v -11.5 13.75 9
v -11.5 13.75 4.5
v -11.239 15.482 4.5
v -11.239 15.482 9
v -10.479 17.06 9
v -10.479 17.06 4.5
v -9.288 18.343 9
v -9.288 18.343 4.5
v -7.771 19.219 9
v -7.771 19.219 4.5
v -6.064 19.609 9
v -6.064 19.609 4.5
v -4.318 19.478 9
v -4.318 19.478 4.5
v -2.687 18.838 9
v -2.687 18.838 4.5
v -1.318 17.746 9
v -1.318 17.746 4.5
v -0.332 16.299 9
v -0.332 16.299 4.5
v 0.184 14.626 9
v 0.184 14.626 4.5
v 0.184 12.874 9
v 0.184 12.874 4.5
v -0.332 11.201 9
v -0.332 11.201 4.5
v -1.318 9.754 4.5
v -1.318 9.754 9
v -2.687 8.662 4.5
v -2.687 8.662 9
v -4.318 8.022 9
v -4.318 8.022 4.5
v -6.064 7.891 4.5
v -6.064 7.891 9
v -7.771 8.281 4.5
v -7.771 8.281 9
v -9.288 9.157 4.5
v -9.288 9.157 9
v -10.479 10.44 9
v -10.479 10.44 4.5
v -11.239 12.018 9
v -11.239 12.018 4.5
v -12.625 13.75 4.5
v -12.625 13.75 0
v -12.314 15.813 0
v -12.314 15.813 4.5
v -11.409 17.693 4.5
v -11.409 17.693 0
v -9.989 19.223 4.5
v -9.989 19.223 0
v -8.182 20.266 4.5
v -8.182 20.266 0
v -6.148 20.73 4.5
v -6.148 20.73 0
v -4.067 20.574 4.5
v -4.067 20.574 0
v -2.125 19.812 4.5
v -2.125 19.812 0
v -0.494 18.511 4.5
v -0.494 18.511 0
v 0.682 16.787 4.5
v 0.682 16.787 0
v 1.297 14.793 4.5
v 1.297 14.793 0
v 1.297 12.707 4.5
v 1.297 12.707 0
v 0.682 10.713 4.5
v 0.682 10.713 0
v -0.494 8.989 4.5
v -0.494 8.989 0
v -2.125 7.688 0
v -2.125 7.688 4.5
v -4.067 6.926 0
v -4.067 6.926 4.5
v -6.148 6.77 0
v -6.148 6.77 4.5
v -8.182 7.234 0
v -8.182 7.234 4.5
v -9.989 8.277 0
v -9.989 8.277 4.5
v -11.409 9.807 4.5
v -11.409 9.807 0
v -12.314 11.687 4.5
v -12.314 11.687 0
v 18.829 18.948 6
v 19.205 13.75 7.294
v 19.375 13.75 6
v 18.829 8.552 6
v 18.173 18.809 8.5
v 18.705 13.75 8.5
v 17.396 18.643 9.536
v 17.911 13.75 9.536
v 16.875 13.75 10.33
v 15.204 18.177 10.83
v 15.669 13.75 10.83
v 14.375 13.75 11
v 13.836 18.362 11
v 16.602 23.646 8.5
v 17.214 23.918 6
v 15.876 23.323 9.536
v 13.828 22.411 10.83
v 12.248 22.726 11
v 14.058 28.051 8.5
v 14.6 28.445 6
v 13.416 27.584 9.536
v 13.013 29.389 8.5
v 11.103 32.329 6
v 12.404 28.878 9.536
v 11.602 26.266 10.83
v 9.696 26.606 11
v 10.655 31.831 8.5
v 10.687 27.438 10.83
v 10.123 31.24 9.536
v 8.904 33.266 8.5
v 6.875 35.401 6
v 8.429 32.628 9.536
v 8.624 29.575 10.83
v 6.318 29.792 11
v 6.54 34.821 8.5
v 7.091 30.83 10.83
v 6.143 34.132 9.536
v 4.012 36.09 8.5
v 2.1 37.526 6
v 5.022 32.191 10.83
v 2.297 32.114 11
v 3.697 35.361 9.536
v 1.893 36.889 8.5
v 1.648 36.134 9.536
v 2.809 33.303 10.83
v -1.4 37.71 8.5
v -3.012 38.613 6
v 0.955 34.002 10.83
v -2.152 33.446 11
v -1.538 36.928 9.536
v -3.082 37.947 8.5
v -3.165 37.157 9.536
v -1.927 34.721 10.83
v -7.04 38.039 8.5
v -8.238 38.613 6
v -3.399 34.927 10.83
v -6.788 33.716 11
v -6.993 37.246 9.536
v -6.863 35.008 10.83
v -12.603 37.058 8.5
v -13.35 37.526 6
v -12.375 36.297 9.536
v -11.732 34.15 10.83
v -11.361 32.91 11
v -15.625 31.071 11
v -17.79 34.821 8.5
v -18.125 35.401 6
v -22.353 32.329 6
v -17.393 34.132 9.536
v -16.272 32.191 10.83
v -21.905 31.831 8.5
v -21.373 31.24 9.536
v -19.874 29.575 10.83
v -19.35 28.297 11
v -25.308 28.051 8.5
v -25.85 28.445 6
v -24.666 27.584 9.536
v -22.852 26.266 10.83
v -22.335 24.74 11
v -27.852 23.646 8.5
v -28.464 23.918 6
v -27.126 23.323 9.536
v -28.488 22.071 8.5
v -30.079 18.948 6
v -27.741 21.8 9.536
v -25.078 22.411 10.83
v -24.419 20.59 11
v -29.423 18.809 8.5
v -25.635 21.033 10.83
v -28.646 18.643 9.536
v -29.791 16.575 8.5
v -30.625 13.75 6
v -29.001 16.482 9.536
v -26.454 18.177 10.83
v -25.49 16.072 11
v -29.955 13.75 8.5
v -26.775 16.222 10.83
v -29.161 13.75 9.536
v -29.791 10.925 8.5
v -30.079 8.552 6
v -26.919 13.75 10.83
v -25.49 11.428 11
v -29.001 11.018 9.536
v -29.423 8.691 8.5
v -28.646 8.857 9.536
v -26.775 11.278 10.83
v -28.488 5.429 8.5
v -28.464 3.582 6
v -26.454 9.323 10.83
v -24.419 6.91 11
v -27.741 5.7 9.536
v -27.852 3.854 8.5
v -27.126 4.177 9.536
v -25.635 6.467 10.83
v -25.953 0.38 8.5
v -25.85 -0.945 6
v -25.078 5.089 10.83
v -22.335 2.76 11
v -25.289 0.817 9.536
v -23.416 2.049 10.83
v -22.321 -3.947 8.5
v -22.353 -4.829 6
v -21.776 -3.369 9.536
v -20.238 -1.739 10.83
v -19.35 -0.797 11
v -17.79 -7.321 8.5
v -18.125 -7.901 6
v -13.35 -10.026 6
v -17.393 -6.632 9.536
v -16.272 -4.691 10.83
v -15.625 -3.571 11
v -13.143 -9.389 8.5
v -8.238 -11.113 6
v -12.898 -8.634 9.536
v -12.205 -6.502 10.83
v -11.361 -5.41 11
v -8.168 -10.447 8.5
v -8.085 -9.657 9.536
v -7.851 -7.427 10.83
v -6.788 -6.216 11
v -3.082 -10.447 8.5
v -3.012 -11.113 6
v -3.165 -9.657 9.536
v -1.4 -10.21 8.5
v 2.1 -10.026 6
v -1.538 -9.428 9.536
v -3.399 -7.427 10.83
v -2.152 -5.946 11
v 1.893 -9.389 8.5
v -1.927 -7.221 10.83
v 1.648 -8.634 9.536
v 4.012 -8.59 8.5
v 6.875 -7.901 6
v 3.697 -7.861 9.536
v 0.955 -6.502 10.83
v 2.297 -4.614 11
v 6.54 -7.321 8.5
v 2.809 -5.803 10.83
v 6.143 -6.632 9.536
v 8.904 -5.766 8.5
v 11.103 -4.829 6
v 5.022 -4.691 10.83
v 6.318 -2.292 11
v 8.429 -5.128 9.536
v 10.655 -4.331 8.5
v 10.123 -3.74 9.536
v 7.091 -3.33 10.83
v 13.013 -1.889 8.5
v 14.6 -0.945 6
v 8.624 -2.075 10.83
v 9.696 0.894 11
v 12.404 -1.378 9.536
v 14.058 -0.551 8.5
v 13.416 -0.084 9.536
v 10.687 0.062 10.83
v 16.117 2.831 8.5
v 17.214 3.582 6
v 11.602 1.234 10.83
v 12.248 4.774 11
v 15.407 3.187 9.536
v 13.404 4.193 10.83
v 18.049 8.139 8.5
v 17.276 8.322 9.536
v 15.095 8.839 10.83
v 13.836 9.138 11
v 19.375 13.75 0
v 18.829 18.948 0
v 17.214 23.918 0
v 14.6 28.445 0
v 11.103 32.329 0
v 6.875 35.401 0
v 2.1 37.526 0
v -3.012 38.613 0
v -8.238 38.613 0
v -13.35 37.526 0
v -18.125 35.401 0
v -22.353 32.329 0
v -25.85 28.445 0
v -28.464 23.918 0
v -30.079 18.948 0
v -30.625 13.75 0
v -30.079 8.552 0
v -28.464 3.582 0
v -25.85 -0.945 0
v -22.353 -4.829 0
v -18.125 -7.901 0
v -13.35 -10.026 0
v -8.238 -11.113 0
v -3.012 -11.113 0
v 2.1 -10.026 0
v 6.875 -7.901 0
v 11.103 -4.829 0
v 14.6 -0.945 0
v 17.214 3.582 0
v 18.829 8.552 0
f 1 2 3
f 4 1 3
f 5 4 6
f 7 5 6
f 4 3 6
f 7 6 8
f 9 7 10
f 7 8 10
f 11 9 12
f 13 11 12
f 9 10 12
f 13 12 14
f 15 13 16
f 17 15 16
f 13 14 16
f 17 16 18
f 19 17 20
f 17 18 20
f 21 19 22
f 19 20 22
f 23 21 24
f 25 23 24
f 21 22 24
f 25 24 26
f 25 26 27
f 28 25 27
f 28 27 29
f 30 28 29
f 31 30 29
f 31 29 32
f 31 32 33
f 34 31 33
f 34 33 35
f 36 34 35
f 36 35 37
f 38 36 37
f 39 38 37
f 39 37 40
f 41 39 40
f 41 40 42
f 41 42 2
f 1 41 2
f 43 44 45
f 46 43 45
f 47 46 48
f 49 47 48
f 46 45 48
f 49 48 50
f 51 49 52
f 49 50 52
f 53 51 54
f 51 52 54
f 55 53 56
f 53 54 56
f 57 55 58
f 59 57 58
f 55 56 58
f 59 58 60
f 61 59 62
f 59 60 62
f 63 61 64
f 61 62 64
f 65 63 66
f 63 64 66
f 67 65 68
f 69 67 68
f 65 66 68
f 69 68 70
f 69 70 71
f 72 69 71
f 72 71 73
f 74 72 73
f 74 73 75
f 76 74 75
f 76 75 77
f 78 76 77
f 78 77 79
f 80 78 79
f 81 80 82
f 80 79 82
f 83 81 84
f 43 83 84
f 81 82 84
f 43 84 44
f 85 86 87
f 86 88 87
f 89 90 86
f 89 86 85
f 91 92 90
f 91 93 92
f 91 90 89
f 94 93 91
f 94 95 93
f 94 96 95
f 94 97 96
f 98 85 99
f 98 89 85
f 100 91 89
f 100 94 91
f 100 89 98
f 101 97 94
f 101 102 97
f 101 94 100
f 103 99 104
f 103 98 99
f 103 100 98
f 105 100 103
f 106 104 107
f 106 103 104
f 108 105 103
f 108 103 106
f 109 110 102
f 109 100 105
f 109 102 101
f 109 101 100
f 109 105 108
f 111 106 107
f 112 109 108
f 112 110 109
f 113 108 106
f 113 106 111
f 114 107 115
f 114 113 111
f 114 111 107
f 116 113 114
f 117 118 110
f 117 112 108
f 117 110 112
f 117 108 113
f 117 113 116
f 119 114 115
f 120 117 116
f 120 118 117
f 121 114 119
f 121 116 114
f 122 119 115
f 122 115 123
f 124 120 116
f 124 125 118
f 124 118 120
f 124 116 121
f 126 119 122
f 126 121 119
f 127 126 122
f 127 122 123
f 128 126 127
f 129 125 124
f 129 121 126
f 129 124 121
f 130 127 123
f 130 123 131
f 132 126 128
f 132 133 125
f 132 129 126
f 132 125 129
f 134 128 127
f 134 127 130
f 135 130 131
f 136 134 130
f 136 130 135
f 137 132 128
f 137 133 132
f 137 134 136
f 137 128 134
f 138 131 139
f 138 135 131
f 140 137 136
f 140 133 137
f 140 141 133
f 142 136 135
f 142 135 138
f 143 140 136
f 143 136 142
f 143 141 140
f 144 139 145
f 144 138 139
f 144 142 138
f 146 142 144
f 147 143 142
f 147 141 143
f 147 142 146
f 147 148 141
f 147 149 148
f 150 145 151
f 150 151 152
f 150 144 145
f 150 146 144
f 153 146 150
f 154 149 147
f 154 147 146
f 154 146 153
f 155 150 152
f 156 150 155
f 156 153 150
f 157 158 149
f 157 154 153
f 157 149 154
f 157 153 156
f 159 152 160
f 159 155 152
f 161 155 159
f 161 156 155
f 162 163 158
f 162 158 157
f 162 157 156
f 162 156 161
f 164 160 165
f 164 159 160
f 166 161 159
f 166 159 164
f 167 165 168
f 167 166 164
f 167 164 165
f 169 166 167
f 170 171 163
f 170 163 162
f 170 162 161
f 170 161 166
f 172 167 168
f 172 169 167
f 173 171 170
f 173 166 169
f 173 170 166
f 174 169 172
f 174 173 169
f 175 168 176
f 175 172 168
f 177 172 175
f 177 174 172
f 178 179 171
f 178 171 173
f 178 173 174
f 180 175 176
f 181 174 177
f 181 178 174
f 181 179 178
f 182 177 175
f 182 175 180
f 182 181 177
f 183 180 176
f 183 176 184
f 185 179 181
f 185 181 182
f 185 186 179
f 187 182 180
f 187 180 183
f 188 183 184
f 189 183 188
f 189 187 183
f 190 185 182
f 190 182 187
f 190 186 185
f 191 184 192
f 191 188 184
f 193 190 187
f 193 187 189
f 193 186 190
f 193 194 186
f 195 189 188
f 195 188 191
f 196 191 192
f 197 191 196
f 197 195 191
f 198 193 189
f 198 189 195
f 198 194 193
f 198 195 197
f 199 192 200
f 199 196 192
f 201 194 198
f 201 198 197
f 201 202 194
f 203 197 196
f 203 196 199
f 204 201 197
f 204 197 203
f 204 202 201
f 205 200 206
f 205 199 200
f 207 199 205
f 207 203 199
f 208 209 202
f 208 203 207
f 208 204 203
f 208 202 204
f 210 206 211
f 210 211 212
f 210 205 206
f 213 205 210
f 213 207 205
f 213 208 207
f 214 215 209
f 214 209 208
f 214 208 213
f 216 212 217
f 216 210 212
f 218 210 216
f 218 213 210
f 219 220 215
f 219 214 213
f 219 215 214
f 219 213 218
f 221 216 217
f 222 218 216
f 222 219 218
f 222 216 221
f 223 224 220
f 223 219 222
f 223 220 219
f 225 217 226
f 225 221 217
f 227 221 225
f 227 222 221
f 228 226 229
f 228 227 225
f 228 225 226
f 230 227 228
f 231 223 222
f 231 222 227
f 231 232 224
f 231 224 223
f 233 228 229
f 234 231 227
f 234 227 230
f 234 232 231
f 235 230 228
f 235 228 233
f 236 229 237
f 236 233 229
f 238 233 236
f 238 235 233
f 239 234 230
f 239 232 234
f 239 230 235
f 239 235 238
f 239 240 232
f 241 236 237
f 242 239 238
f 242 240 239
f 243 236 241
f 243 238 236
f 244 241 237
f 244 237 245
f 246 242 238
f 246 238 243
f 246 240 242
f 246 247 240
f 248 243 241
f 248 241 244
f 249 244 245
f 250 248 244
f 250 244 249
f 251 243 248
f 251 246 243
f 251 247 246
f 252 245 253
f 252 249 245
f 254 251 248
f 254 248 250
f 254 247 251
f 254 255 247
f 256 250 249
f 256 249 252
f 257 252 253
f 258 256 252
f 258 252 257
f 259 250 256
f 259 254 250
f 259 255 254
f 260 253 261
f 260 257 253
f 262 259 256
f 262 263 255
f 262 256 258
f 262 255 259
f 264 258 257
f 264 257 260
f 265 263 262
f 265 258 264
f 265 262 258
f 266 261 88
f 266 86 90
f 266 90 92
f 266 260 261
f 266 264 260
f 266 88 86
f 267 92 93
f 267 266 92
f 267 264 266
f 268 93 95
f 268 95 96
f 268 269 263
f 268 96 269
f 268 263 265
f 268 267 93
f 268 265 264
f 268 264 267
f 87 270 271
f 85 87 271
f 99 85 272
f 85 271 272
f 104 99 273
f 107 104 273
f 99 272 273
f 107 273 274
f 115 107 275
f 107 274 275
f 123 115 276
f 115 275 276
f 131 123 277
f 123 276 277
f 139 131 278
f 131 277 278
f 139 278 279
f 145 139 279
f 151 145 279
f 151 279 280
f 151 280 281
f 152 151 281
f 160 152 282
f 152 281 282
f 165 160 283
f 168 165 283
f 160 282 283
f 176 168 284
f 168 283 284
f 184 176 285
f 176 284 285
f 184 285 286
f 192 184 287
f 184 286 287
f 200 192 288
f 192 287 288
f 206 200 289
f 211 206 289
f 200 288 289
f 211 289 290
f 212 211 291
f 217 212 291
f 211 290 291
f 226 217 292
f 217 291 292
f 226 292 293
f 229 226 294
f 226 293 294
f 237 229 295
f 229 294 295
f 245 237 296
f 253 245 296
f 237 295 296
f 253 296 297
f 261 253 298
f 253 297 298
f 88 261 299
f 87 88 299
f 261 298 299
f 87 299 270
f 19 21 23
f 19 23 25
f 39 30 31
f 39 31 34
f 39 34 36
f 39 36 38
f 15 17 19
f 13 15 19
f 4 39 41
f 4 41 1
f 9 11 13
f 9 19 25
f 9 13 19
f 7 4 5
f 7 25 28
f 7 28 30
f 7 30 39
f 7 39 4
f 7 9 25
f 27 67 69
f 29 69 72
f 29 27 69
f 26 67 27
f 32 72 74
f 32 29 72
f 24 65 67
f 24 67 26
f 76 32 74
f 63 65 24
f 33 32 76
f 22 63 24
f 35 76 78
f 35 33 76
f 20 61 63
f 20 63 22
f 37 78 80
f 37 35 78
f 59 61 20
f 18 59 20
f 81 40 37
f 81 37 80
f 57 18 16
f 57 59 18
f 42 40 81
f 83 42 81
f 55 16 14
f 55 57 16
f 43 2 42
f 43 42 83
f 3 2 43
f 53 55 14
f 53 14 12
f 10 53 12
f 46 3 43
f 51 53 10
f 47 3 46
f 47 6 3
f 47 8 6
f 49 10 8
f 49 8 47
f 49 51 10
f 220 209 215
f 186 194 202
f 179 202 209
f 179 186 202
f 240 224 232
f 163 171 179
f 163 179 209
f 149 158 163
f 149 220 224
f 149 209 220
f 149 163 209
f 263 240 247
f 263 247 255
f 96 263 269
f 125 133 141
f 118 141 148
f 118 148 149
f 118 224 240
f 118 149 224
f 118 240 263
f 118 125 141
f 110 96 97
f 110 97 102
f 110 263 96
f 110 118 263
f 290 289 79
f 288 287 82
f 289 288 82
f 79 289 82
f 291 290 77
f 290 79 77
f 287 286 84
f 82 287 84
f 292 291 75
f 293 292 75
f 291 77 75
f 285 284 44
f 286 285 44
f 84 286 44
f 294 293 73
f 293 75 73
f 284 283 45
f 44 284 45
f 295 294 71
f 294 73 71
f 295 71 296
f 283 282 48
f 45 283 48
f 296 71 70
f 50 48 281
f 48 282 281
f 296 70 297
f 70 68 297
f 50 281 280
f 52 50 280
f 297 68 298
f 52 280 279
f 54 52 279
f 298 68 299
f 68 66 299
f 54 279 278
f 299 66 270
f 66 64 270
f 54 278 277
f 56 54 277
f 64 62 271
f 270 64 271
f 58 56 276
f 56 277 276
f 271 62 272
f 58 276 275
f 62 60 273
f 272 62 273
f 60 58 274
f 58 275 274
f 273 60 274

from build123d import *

# Parameters (mm, degrees)
CROQUIS1_R              = 25
SALIENTE_EXTRUIR1_DEPTH = 11
REDONDEO1_R             = 5
CROQUIS2_R              = 5.875
CORTAR_EXTRUIR1_DEPTH   = 9
CROQUIS3_R              = 7
CORTAR_EXTRUIR2_DEPTH   = 4.5


with BuildPart() as part:
    # Croquis1 → Saliente-Extruir1 (new body)
    with BuildSketch(Plane.XY):
        with Locations((-5.625, 13.75)):
            Circle(CROQUIS1_R)
    extrude(amount=SALIENTE_EXTRUIR1_DEPTH)

    # Redondeo1
    redondeo1_edges = [part.edges().sort_by_distance(p)[0] for p in [
        (-30.625, 13.75, 11),
    ]]
    fillet(redondeo1_edges, radius=REDONDEO1_R)

    # Croquis2 → Cortar-Extruir1 (cut)
    with BuildSketch(Plane(origin=(0, 0, 0), x_dir=(-1, 0, 0), z_dir=(0, 0, -1))):
        with Locations((5.625, 13.75)):
            Circle(CROQUIS2_R)
    extrude(amount=-CORTAR_EXTRUIR1_DEPTH, mode=Mode.SUBTRACT)

    # Croquis3 → Cortar-Extruir2 (cut)
    with BuildSketch(Plane(origin=(0, 0, 0), x_dir=(-1, 0, 0), z_dir=(0, 0, -1))):
        with Locations((5.625, 13.75)):
            Circle(CROQUIS3_R)
    extrude(amount=-CORTAR_EXTRUIR2_DEPTH, mode=Mode.SUBTRACT)


solid = part.part
